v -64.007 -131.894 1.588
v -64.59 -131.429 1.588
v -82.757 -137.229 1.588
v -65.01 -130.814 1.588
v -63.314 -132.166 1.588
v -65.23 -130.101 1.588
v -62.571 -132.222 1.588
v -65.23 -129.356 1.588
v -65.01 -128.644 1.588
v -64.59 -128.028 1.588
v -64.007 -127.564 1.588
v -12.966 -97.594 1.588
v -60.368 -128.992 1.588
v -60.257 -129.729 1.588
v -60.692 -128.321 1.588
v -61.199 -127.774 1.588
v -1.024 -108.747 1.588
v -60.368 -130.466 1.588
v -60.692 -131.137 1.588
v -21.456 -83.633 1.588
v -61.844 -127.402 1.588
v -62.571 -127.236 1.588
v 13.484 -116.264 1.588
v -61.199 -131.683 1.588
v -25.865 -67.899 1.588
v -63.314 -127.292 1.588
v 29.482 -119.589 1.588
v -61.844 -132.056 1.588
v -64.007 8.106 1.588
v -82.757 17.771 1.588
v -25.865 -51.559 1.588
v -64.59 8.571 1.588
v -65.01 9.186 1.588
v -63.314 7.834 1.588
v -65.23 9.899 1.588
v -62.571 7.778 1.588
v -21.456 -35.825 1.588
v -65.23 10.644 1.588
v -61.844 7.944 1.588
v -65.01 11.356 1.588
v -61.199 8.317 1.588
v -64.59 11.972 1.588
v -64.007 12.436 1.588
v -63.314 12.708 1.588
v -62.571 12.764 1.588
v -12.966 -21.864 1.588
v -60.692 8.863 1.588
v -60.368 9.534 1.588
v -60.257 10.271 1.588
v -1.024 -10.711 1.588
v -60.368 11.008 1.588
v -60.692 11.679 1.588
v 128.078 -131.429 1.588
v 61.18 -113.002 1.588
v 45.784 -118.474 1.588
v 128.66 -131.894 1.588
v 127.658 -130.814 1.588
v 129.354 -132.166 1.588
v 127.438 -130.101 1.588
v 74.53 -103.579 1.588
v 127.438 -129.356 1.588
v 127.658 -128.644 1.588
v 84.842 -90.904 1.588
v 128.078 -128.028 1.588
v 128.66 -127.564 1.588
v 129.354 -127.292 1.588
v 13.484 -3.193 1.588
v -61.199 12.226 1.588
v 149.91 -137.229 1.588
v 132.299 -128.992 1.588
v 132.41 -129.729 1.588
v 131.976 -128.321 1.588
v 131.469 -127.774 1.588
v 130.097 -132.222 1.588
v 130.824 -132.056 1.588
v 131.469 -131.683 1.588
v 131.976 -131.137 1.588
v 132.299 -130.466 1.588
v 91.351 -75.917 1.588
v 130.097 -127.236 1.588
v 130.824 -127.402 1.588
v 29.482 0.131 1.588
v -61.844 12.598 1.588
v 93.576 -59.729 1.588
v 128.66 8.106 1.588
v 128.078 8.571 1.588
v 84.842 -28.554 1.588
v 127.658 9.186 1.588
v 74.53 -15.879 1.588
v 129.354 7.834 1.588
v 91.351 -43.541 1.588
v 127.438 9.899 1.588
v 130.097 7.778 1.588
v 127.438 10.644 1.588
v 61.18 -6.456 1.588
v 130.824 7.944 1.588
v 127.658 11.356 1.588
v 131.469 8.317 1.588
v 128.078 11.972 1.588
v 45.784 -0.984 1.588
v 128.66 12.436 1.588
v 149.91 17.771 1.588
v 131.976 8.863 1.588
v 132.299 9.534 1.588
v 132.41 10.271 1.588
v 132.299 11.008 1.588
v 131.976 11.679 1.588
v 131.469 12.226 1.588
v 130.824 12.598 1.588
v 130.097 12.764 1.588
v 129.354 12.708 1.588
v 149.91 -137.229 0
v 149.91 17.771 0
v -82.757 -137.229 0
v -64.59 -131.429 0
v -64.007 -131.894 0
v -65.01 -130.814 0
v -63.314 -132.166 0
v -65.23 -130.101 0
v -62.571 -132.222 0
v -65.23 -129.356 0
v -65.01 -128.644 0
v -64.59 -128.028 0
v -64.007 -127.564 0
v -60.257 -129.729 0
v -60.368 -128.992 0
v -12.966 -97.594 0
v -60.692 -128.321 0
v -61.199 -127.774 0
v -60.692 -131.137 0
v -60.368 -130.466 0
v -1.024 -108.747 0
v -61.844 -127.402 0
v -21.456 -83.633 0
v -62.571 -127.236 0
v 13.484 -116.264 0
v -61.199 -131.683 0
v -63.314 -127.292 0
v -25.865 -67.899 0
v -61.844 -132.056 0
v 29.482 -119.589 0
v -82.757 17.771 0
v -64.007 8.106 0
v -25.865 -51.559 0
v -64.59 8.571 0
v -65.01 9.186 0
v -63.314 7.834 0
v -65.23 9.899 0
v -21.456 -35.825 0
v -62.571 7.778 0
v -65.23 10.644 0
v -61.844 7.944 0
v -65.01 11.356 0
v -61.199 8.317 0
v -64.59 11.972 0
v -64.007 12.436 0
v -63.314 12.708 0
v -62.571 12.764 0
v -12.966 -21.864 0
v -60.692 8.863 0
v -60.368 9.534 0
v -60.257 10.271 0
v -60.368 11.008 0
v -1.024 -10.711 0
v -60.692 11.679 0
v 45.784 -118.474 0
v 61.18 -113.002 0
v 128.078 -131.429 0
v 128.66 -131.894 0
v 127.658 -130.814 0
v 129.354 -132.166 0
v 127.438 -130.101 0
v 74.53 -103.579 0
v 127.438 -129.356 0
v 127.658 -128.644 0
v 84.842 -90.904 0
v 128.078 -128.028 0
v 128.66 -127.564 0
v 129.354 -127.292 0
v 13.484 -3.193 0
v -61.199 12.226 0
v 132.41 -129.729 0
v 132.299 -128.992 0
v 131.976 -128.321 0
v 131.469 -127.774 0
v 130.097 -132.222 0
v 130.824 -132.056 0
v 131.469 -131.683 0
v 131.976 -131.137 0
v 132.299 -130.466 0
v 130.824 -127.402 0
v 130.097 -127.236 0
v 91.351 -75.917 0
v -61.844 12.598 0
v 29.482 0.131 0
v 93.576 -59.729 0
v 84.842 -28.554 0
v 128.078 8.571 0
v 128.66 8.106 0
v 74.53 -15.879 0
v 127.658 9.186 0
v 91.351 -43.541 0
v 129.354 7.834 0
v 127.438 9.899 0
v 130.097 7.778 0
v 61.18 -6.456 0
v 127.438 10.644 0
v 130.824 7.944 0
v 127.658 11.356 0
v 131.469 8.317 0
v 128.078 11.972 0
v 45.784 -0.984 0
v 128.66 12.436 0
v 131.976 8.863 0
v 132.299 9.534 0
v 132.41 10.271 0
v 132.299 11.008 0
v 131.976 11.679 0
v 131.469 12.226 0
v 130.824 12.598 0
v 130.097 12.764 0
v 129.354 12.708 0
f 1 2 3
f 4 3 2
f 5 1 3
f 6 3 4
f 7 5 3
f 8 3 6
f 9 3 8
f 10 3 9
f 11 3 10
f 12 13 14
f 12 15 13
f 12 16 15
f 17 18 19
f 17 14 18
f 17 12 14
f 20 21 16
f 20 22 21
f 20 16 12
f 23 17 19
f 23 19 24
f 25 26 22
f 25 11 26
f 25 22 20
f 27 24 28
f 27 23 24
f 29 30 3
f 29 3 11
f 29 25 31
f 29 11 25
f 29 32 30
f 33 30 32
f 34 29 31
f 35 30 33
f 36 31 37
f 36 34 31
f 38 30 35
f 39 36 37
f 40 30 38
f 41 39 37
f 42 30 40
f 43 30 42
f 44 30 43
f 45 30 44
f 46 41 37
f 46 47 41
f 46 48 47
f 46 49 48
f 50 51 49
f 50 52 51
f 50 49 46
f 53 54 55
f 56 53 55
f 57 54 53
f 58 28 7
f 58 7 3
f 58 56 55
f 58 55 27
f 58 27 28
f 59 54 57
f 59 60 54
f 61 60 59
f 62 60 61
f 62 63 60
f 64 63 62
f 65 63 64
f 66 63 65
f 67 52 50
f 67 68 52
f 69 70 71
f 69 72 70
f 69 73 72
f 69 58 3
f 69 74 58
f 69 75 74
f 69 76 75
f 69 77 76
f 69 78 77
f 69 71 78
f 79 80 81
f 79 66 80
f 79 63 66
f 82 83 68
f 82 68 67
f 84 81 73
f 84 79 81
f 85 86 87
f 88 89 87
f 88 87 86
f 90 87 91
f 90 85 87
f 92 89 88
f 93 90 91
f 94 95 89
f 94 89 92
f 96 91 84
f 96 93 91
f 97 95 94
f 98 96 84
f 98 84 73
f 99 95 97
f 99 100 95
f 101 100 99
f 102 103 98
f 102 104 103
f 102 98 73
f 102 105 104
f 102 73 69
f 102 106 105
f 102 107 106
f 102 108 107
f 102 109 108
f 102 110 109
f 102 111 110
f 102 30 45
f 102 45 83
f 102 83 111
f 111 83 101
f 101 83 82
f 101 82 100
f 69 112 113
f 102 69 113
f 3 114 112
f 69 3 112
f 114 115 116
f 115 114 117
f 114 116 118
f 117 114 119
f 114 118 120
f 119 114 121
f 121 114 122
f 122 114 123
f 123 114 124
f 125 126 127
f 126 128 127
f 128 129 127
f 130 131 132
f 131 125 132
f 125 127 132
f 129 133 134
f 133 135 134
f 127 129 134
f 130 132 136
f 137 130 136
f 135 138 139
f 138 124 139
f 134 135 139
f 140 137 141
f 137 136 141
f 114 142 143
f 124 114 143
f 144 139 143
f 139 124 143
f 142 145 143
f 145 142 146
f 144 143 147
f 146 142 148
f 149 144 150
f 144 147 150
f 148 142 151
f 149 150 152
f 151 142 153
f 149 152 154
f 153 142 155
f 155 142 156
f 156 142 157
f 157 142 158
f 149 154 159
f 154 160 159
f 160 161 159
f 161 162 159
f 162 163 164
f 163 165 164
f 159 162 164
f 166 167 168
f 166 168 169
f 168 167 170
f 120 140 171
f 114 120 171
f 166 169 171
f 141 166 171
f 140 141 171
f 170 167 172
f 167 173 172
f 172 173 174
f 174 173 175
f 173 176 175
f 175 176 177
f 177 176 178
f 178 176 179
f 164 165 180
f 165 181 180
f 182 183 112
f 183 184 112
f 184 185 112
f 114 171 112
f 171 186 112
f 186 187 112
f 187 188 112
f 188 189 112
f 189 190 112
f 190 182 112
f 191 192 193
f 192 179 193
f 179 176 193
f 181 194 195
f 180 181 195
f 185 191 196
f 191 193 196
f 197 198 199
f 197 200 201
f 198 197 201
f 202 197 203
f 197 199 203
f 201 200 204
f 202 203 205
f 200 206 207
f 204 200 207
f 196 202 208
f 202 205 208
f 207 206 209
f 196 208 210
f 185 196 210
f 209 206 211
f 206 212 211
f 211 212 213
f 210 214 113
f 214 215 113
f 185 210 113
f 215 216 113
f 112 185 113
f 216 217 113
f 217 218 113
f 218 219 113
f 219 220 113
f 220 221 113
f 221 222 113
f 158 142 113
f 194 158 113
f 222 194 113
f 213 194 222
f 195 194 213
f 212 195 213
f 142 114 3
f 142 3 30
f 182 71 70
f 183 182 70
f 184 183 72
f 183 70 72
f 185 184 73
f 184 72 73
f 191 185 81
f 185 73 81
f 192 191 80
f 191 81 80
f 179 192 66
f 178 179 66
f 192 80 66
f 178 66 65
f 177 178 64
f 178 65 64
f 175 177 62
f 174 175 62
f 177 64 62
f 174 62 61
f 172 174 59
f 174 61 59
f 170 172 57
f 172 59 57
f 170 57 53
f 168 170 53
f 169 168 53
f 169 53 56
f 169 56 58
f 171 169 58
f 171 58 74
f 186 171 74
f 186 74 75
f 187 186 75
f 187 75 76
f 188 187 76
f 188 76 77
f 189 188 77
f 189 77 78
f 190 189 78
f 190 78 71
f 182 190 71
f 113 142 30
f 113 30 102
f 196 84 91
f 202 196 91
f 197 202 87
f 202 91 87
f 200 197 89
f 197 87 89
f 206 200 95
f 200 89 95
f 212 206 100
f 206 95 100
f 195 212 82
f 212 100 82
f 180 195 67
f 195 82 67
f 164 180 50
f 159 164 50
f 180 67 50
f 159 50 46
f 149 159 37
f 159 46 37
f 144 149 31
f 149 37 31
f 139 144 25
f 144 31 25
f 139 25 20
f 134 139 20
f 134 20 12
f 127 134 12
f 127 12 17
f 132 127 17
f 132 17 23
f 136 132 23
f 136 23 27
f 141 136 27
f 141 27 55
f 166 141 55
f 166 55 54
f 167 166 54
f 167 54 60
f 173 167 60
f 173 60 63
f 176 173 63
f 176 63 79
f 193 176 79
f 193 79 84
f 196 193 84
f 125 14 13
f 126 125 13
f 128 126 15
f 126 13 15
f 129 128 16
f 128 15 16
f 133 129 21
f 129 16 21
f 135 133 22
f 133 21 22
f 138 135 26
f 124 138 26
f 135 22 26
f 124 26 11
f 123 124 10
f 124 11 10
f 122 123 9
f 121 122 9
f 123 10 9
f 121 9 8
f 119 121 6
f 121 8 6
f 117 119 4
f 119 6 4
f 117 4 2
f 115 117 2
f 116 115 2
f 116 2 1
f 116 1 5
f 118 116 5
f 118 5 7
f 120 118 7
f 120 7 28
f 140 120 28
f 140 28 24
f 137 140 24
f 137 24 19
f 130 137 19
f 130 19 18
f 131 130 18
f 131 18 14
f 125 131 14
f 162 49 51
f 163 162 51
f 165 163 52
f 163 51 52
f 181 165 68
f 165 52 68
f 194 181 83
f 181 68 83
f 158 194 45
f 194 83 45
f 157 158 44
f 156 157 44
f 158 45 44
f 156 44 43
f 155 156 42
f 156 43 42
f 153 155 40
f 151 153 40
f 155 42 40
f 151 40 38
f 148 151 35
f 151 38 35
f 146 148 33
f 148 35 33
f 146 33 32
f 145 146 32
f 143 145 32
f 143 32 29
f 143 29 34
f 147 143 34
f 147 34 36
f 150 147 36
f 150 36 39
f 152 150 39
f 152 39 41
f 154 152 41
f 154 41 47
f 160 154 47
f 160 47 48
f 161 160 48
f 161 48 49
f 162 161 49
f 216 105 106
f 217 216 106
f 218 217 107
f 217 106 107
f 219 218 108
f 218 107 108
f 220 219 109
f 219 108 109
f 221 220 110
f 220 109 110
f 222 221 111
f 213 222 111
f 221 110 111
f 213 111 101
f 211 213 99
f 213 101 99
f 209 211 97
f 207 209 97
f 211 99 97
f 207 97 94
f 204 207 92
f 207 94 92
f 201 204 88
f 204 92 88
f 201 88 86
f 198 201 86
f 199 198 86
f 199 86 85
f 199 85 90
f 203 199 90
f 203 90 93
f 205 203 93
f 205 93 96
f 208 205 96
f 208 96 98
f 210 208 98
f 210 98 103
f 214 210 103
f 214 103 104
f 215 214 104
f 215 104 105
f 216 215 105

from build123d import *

# Parameters (mm, degrees)
SKETCH1_W           = 232.6676516
SKETCH1_H           = 155
BOSS_EXTRUDE1_DEPTH = 1.5875
SKETCH2_R           = 60
CUT_EXTRUDE1_DEPTH  = 204.242095442
SKETCH6_R           = 2.5
CUT_EXTRUDE2_DEPTH  = 204.242095442


with BuildPart() as part:
    # Sketch1 → Boss-Extrude1 (new body)
    with BuildSketch(Plane.XY):
        with Locations((33.576399593, -59.72883635)):
            Rectangle(SKETCH1_W, SKETCH1_H)
    extrude(amount=BOSS_EXTRUDE1_DEPTH)

    # Sketch2 → Cut-Extrude1 (cut, through all)
    with BuildSketch(Plane.XY.offset(1.5875)):
        with Locations((33.576399593, -59.72883635)):
            Circle(SKETCH2_R)
    extrude(amount=-CUT_EXTRUDE1_DEPTH, mode=Mode.SUBTRACT)

    # Sketch6 → Cut-Extrude2 (cut, through all)
    with BuildSketch(Plane.XY.offset(1.5875)):
        with Locations((129.910225393, 10.27116365)):
            Circle(SKETCH6_R)
        with Locations((129.910225393, -129.72883635)):
            Circle(SKETCH6_R)
        with Locations((-62.757426207, 10.27116365)):
            Circle(SKETCH6_R)
        with Locations((-62.757426207, -129.72883635)):
            Circle(SKETCH6_R)
    extrude(amount=-CUT_EXTRUDE2_DEPTH, mode=Mode.SUBTRACT)


solid = part.part
